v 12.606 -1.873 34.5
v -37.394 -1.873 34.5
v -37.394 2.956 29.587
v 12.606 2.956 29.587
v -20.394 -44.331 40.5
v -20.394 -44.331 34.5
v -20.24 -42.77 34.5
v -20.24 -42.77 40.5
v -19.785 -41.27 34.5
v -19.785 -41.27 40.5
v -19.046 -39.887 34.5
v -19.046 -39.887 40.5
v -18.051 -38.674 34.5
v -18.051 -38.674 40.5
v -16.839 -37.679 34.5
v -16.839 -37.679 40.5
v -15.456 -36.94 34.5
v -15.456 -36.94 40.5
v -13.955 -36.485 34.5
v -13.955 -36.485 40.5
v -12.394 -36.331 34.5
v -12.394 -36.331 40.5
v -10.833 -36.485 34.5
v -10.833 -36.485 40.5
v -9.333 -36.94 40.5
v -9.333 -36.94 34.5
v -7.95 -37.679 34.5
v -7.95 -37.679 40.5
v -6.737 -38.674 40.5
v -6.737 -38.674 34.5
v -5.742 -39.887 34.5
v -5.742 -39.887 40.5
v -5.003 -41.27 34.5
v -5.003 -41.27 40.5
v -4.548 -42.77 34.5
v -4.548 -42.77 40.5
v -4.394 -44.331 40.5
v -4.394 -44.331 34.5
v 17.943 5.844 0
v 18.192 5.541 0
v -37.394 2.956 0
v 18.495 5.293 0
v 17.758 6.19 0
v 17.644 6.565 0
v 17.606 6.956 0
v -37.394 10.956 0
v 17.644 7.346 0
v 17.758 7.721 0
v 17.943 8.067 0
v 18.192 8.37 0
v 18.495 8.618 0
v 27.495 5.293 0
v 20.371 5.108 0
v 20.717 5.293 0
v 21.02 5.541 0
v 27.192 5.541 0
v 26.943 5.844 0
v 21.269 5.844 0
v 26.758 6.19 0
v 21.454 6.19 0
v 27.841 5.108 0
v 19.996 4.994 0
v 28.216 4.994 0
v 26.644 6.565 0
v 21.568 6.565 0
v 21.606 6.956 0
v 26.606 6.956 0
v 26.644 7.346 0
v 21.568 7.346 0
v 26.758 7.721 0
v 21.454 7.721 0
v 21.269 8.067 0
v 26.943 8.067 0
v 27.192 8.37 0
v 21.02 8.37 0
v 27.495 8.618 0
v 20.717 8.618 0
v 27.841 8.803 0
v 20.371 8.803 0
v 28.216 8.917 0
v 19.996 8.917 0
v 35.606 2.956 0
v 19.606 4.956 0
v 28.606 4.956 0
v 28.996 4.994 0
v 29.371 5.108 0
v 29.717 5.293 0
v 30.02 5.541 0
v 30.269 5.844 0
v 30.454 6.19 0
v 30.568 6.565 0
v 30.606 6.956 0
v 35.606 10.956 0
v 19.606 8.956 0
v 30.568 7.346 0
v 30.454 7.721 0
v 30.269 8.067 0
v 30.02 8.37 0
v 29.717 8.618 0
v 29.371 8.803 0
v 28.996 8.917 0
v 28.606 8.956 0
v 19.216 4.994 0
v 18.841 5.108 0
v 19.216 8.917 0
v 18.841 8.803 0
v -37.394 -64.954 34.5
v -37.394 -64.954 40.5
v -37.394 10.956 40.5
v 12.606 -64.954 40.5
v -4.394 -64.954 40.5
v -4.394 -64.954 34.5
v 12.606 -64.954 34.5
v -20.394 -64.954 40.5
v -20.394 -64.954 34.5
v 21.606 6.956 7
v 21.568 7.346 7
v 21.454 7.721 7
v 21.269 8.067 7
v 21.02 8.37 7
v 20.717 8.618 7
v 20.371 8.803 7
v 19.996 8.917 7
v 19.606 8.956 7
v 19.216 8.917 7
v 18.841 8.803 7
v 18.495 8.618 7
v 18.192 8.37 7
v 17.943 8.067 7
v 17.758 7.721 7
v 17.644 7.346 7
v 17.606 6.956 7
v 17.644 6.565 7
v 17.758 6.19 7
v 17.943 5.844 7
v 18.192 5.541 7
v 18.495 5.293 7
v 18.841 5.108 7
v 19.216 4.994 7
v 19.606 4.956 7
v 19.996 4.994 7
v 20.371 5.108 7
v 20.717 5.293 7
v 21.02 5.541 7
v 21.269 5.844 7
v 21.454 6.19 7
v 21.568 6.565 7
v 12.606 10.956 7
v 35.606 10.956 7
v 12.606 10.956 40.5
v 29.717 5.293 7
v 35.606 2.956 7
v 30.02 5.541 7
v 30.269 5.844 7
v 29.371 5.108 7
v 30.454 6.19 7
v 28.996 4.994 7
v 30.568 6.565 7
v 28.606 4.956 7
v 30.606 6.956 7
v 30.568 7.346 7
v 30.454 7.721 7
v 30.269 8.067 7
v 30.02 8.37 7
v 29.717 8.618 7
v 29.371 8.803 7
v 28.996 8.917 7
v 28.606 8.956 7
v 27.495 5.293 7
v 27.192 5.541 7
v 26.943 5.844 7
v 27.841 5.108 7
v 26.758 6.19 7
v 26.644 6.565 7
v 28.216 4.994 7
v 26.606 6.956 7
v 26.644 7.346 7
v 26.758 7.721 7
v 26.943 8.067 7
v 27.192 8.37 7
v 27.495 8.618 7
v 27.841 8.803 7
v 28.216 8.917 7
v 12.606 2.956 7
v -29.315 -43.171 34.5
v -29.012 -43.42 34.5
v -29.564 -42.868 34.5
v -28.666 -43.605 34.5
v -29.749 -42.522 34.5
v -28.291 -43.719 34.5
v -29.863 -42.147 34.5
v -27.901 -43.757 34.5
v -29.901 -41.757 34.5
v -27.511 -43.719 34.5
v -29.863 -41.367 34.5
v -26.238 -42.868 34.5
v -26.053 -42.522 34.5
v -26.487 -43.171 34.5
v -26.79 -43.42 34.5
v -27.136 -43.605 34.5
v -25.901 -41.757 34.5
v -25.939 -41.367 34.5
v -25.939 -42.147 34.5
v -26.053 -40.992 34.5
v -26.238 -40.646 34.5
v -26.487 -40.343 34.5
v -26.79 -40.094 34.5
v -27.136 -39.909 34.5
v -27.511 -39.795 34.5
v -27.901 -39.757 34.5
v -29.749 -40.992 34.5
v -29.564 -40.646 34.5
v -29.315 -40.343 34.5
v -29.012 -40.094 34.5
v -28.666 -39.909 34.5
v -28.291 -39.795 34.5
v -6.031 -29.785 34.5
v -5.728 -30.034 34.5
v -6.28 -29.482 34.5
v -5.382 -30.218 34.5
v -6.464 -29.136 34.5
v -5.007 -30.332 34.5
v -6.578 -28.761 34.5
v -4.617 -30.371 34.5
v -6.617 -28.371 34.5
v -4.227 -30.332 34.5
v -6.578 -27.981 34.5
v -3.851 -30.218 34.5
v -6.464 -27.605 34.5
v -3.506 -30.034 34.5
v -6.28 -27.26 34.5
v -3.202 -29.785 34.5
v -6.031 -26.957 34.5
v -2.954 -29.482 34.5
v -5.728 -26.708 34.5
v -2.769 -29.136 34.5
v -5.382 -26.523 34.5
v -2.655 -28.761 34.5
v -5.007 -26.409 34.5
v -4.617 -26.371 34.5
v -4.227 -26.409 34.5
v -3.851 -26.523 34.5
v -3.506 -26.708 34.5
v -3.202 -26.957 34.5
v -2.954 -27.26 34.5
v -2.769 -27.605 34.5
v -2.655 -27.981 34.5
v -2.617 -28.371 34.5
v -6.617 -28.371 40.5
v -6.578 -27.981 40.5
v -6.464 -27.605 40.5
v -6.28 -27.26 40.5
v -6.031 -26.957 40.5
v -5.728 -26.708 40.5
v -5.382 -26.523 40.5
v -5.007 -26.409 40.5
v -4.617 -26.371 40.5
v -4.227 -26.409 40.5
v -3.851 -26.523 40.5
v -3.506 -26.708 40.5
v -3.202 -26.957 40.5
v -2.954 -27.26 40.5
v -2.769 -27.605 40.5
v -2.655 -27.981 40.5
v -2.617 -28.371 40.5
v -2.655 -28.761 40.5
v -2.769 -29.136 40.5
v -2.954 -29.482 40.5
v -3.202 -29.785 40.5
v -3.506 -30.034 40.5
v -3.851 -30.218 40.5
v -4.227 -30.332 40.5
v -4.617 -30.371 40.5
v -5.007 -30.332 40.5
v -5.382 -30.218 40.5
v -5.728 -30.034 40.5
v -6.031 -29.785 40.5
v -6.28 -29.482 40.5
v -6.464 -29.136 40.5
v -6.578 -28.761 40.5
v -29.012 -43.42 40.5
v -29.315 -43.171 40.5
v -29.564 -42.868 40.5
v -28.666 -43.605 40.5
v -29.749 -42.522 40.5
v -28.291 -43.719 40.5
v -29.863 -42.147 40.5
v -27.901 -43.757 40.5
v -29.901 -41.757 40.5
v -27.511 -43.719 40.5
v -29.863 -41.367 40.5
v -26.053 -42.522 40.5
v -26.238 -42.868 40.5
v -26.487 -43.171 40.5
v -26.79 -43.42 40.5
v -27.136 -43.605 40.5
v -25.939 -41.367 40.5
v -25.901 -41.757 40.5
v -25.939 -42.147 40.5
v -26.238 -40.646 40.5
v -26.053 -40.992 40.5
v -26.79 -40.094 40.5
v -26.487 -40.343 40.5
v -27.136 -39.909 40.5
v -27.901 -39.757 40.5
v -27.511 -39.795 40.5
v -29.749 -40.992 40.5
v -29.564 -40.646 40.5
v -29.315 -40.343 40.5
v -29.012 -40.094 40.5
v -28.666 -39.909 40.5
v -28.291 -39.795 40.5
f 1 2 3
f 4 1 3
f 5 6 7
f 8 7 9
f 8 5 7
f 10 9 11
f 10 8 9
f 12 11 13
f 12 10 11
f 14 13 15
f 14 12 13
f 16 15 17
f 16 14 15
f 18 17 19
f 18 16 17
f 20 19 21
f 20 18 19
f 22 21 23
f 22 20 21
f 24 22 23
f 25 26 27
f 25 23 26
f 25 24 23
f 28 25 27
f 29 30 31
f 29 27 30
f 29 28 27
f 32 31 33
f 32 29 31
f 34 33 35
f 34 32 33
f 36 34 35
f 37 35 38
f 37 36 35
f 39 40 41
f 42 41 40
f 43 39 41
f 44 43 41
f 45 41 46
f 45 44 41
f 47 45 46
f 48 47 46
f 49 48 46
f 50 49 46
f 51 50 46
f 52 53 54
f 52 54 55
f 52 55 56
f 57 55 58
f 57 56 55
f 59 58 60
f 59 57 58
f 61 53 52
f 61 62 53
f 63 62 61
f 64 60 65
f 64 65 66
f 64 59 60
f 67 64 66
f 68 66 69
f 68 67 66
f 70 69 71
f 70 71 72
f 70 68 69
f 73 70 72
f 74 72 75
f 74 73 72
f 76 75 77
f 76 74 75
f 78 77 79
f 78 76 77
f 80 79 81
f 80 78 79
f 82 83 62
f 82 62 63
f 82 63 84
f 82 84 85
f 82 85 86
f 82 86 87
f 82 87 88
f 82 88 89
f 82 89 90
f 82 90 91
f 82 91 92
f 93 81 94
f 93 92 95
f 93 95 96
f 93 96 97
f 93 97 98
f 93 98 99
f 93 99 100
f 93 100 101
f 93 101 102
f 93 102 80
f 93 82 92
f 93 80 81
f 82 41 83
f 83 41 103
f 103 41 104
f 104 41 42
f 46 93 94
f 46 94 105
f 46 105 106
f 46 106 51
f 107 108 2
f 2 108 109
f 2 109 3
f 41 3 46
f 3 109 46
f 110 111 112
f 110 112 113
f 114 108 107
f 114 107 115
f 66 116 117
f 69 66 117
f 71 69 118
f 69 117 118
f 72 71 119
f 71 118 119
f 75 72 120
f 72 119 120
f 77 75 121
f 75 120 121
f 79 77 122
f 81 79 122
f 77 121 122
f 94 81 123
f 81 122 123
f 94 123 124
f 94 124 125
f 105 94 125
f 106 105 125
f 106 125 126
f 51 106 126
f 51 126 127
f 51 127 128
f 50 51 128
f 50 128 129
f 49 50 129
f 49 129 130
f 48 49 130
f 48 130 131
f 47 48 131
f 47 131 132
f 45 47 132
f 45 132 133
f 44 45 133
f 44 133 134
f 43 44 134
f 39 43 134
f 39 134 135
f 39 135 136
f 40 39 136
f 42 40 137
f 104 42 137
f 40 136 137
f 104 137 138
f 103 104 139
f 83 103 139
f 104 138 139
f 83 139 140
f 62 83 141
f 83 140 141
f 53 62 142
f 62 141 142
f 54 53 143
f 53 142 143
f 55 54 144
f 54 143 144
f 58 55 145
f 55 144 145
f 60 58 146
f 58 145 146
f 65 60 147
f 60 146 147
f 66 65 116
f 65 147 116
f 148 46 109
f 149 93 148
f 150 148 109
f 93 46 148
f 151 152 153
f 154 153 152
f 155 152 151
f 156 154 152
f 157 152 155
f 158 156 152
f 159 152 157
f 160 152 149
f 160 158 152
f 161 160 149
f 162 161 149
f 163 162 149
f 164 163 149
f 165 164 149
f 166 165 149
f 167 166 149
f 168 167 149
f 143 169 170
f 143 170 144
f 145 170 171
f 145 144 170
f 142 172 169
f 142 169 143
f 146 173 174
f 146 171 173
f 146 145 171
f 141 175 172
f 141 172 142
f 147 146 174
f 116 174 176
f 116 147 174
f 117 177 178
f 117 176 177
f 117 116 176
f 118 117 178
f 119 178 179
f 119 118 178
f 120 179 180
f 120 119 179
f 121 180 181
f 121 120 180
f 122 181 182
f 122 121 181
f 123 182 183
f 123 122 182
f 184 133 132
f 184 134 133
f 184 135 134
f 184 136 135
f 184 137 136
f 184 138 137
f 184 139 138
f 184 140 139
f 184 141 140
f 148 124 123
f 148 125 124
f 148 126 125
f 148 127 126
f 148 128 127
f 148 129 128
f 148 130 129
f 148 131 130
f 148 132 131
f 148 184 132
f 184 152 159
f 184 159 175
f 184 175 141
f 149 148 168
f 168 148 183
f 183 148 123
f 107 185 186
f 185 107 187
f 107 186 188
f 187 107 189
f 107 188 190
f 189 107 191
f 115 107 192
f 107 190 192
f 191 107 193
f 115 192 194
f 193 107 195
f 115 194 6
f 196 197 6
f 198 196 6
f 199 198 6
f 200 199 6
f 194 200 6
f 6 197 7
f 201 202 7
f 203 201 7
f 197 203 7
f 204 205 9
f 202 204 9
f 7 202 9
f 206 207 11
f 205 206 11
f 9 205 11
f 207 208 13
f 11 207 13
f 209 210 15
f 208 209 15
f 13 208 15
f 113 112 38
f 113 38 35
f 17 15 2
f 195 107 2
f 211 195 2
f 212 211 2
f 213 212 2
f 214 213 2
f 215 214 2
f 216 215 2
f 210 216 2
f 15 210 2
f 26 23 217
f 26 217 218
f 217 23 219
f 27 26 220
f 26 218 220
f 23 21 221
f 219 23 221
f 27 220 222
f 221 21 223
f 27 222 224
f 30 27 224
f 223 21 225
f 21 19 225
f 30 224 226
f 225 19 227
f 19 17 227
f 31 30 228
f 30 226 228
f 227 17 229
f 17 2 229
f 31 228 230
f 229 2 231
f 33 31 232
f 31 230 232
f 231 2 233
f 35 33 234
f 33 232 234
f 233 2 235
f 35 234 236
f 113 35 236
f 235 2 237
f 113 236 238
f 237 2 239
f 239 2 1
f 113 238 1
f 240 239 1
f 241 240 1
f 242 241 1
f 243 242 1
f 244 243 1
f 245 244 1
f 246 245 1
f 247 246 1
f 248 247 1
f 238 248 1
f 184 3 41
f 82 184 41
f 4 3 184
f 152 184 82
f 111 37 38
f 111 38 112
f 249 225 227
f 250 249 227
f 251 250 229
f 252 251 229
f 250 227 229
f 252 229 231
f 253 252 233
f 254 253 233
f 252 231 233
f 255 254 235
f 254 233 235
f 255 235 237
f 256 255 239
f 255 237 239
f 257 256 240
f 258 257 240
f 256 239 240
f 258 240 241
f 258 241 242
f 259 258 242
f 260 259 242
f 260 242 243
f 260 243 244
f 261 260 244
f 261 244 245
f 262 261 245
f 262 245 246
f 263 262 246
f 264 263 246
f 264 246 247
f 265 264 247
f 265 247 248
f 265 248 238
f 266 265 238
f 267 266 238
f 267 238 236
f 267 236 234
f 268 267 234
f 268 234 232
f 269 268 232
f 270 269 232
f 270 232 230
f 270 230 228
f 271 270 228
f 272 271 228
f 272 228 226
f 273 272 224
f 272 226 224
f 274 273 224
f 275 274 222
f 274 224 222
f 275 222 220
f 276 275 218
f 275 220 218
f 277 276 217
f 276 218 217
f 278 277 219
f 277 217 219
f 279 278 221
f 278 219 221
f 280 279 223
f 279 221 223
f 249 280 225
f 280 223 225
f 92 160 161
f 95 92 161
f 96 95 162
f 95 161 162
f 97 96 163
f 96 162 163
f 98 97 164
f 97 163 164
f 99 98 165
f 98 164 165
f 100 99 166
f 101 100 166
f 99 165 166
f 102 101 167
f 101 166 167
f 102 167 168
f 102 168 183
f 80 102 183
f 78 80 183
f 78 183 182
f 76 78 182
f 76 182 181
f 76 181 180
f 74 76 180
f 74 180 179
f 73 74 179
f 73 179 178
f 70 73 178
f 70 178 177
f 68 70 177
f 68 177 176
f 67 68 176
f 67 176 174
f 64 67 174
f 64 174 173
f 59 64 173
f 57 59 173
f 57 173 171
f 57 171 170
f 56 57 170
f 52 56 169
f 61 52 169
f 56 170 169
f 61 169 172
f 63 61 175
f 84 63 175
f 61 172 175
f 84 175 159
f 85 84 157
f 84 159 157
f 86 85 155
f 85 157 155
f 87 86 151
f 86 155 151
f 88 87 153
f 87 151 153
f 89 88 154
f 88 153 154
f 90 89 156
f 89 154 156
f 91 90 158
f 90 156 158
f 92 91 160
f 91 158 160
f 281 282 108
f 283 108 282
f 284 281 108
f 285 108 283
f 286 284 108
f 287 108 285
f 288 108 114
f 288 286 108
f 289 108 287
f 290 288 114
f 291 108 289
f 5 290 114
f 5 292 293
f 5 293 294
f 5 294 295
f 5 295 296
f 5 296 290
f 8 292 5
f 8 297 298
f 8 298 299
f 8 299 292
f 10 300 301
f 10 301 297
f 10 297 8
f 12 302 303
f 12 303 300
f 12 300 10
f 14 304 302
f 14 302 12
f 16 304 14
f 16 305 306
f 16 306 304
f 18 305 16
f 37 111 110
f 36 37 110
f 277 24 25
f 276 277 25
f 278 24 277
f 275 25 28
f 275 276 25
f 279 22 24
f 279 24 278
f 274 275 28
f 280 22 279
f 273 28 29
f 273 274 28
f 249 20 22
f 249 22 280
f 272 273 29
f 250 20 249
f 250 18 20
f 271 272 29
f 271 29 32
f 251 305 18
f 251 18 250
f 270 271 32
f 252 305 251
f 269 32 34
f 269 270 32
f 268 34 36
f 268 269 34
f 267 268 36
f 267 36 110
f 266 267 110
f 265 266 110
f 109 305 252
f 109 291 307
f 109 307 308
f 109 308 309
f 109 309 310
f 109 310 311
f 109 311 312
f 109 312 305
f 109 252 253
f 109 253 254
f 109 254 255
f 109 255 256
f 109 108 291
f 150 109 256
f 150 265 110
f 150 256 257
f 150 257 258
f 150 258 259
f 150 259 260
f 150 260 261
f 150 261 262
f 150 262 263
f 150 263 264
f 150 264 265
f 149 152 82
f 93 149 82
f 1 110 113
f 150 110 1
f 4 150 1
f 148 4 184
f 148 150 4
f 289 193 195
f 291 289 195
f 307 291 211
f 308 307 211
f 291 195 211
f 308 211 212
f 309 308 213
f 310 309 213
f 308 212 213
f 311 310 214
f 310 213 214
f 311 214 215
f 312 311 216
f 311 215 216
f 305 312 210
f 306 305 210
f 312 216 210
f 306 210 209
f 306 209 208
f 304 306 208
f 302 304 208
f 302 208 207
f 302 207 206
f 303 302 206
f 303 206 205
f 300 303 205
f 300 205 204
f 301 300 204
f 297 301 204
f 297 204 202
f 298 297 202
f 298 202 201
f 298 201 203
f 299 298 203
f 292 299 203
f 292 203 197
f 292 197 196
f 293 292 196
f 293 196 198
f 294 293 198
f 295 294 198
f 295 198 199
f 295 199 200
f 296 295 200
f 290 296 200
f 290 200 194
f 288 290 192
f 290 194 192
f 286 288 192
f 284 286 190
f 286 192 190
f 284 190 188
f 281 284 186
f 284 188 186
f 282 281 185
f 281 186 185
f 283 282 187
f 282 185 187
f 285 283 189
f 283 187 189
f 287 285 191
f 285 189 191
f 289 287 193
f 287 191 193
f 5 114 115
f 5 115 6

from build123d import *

# Parameters (mm, degrees)
SKETCH1_W           = 50
SKETCH1_H           = 18
BOSS_EXTRUDE1_DEPTH = 7
SKETCH2_W           = 50
SKETCH2_H           = 8
BOSS_EXTRUDE2_DEPTH = 33.5
SKETCH3_W           = 7
SKETCH3_H           = 8
BOSS_EXTRUDE3_DEPTH = 23
SKETCH4_W           = 7
SKETCH4_H           = 8
BOSS_EXTRUDE4_DEPTH = 14
SKETCH5_W           = 50
SKETCH5_H           = 10
CUT_EXTRUDE1_DEPTH  = 14
SKETCH6_R           = 2
CUT_EXTRUDE2_DEPTH  = 14
SKETCH7_W           = 50
SKETCH7_H           = 6
BOSS_EXTRUDE5_DEPTH = 67.91
CUT_EXTRUDE3_DEPTH  = 35
SKETCH9_R           = 2
CUT_EXTRUDE5_DEPTH  = 35
BOSS_EXTRUDE8_DEPTH = 50
SKETCH13_W          = 14
SKETCH13_H          = 8
CUT_EXTRUDE6_DEPTH  = 10


with BuildPart() as part:
    # Sketch1 → Boss-Extrude1 (new body)
    with BuildSketch(Plane.XY):
        with Locations((-12.394067797, 1.955508475)):
            Rectangle(SKETCH1_W, SKETCH1_H)
    extrude(amount=BOSS_EXTRUDE1_DEPTH)

    # Sketch2 → Boss-Extrude2 (add)
    with BuildSketch(Plane.XY.offset(7)):
        with Locations((-12.394067797, 6.955508475)):
            Rectangle(SKETCH2_W, SKETCH2_H)
    extrude(amount=BOSS_EXTRUDE2_DEPTH)

    # Sketch3 → Boss-Extrude3 (add)
    with BuildSketch(Plane(origin=(12.605932203, 0, 0), x_dir=(0, 0, -1), z_dir=(1, 0, 0))):
        with Locations((-3.5, 6.955508475)):
            Rectangle(SKETCH3_W, SKETCH3_H)
    extrude(amount=BOSS_EXTRUDE3_DEPTH)

    # Sketch4 → Boss-Extrude4 (add)
    with BuildSketch(Plane.ZY.offset(37.394067797)):
        with Locations((3.5, 6.955508475)):
            Rectangle(SKETCH4_W, SKETCH4_H)
    extrude(amount=BOSS_EXTRUDE4_DEPTH)

    # Sketch5 → Cut-Extrude1 (cut)
    with BuildSketch(Plane.XY.offset(7)):
        with Locations((-12.394067797, -2.044491525)):
            Rectangle(SKETCH5_W, SKETCH5_H)
    extrude(amount=-CUT_EXTRUDE1_DEPTH, mode=Mode.SUBTRACT)

    # Sketch6 → Cut-Extrude2 (cut)
    with BuildSketch(Plane.XY.offset(7)):
        with Locations((19.605932203, 6.955508475)):
            Circle(SKETCH6_R)
        with Locations((28.605932203, 6.955508475)):
            Circle(SKETCH6_R)
    extrude(amount=-CUT_EXTRUDE2_DEPTH, mode=Mode.SUBTRACT)

    # Sketch7 → Boss-Extrude5 (add)
    with BuildSketch(Plane.XZ.offset(-2.955508475)):
        with Locations((-12.394067797, 37.5)):
            Rectangle(SKETCH7_W, SKETCH7_H)
    extrude(amount=BOSS_EXTRUDE5_DEPTH)

    # Sketch8 → Cut-Extrude3 (cut)
    with BuildSketch(Plane.XY.offset(40.5)):
        with BuildLine():
            Line((-4.394067797, -44.33115583), (-4.394067797, -64.954491525))
            ThreePointArc((-4.394067797, -64.954491525), (-12.394067797, -72.954491525), (-20.394067797, -64.954491525))
            Line((-20.394067797, -64.954491525), (-20.394067797, -44.33115583))
            ThreePointArc((-20.394067797, -44.33115583), (-12.394067797, -36.33115583), (-4.394067797, -44.33115583))
        make_face()
    extrude(amount=-CUT_EXTRUDE3_DEPTH, mode=Mode.SUBTRACT)

    # Sketch9 → Cut-Extrude5 (cut)
    with BuildSketch(Plane(origin=(0, 0, 34.5), x_dir=(-1, 0, 0), z_dir=(0, 0, -1))):
        with Locations((27.901028765, -41.756933891)):
            Circle(SKETCH9_R)
        with Locations((4.616687569, -28.370715783)):
            Circle(SKETCH9_R)
    extrude(amount=-CUT_EXTRUDE5_DEPTH, mode=Mode.SUBTRACT)

    # Sketch12 → Boss-Extrude8 (add)
    with BuildSketch(Plane.ZY.offset(37.394067797)):
        Polygon((34.5, -1.873493289), (29.5872605, 2.955508475), (34.5, 2.955508475), align=None)
    extrude(amount=-BOSS_EXTRUDE8_DEPTH)

    # Sketch13 → Cut-Extrude6 (cut)
    with BuildSketch(Plane.XY.offset(7)):
        with Locations((-44.394067797, 6.955508475)):
            Rectangle(SKETCH13_W, SKETCH13_H)
    extrude(amount=-CUT_EXTRUDE6_DEPTH, mode=Mode.SUBTRACT)


solid = part.part
